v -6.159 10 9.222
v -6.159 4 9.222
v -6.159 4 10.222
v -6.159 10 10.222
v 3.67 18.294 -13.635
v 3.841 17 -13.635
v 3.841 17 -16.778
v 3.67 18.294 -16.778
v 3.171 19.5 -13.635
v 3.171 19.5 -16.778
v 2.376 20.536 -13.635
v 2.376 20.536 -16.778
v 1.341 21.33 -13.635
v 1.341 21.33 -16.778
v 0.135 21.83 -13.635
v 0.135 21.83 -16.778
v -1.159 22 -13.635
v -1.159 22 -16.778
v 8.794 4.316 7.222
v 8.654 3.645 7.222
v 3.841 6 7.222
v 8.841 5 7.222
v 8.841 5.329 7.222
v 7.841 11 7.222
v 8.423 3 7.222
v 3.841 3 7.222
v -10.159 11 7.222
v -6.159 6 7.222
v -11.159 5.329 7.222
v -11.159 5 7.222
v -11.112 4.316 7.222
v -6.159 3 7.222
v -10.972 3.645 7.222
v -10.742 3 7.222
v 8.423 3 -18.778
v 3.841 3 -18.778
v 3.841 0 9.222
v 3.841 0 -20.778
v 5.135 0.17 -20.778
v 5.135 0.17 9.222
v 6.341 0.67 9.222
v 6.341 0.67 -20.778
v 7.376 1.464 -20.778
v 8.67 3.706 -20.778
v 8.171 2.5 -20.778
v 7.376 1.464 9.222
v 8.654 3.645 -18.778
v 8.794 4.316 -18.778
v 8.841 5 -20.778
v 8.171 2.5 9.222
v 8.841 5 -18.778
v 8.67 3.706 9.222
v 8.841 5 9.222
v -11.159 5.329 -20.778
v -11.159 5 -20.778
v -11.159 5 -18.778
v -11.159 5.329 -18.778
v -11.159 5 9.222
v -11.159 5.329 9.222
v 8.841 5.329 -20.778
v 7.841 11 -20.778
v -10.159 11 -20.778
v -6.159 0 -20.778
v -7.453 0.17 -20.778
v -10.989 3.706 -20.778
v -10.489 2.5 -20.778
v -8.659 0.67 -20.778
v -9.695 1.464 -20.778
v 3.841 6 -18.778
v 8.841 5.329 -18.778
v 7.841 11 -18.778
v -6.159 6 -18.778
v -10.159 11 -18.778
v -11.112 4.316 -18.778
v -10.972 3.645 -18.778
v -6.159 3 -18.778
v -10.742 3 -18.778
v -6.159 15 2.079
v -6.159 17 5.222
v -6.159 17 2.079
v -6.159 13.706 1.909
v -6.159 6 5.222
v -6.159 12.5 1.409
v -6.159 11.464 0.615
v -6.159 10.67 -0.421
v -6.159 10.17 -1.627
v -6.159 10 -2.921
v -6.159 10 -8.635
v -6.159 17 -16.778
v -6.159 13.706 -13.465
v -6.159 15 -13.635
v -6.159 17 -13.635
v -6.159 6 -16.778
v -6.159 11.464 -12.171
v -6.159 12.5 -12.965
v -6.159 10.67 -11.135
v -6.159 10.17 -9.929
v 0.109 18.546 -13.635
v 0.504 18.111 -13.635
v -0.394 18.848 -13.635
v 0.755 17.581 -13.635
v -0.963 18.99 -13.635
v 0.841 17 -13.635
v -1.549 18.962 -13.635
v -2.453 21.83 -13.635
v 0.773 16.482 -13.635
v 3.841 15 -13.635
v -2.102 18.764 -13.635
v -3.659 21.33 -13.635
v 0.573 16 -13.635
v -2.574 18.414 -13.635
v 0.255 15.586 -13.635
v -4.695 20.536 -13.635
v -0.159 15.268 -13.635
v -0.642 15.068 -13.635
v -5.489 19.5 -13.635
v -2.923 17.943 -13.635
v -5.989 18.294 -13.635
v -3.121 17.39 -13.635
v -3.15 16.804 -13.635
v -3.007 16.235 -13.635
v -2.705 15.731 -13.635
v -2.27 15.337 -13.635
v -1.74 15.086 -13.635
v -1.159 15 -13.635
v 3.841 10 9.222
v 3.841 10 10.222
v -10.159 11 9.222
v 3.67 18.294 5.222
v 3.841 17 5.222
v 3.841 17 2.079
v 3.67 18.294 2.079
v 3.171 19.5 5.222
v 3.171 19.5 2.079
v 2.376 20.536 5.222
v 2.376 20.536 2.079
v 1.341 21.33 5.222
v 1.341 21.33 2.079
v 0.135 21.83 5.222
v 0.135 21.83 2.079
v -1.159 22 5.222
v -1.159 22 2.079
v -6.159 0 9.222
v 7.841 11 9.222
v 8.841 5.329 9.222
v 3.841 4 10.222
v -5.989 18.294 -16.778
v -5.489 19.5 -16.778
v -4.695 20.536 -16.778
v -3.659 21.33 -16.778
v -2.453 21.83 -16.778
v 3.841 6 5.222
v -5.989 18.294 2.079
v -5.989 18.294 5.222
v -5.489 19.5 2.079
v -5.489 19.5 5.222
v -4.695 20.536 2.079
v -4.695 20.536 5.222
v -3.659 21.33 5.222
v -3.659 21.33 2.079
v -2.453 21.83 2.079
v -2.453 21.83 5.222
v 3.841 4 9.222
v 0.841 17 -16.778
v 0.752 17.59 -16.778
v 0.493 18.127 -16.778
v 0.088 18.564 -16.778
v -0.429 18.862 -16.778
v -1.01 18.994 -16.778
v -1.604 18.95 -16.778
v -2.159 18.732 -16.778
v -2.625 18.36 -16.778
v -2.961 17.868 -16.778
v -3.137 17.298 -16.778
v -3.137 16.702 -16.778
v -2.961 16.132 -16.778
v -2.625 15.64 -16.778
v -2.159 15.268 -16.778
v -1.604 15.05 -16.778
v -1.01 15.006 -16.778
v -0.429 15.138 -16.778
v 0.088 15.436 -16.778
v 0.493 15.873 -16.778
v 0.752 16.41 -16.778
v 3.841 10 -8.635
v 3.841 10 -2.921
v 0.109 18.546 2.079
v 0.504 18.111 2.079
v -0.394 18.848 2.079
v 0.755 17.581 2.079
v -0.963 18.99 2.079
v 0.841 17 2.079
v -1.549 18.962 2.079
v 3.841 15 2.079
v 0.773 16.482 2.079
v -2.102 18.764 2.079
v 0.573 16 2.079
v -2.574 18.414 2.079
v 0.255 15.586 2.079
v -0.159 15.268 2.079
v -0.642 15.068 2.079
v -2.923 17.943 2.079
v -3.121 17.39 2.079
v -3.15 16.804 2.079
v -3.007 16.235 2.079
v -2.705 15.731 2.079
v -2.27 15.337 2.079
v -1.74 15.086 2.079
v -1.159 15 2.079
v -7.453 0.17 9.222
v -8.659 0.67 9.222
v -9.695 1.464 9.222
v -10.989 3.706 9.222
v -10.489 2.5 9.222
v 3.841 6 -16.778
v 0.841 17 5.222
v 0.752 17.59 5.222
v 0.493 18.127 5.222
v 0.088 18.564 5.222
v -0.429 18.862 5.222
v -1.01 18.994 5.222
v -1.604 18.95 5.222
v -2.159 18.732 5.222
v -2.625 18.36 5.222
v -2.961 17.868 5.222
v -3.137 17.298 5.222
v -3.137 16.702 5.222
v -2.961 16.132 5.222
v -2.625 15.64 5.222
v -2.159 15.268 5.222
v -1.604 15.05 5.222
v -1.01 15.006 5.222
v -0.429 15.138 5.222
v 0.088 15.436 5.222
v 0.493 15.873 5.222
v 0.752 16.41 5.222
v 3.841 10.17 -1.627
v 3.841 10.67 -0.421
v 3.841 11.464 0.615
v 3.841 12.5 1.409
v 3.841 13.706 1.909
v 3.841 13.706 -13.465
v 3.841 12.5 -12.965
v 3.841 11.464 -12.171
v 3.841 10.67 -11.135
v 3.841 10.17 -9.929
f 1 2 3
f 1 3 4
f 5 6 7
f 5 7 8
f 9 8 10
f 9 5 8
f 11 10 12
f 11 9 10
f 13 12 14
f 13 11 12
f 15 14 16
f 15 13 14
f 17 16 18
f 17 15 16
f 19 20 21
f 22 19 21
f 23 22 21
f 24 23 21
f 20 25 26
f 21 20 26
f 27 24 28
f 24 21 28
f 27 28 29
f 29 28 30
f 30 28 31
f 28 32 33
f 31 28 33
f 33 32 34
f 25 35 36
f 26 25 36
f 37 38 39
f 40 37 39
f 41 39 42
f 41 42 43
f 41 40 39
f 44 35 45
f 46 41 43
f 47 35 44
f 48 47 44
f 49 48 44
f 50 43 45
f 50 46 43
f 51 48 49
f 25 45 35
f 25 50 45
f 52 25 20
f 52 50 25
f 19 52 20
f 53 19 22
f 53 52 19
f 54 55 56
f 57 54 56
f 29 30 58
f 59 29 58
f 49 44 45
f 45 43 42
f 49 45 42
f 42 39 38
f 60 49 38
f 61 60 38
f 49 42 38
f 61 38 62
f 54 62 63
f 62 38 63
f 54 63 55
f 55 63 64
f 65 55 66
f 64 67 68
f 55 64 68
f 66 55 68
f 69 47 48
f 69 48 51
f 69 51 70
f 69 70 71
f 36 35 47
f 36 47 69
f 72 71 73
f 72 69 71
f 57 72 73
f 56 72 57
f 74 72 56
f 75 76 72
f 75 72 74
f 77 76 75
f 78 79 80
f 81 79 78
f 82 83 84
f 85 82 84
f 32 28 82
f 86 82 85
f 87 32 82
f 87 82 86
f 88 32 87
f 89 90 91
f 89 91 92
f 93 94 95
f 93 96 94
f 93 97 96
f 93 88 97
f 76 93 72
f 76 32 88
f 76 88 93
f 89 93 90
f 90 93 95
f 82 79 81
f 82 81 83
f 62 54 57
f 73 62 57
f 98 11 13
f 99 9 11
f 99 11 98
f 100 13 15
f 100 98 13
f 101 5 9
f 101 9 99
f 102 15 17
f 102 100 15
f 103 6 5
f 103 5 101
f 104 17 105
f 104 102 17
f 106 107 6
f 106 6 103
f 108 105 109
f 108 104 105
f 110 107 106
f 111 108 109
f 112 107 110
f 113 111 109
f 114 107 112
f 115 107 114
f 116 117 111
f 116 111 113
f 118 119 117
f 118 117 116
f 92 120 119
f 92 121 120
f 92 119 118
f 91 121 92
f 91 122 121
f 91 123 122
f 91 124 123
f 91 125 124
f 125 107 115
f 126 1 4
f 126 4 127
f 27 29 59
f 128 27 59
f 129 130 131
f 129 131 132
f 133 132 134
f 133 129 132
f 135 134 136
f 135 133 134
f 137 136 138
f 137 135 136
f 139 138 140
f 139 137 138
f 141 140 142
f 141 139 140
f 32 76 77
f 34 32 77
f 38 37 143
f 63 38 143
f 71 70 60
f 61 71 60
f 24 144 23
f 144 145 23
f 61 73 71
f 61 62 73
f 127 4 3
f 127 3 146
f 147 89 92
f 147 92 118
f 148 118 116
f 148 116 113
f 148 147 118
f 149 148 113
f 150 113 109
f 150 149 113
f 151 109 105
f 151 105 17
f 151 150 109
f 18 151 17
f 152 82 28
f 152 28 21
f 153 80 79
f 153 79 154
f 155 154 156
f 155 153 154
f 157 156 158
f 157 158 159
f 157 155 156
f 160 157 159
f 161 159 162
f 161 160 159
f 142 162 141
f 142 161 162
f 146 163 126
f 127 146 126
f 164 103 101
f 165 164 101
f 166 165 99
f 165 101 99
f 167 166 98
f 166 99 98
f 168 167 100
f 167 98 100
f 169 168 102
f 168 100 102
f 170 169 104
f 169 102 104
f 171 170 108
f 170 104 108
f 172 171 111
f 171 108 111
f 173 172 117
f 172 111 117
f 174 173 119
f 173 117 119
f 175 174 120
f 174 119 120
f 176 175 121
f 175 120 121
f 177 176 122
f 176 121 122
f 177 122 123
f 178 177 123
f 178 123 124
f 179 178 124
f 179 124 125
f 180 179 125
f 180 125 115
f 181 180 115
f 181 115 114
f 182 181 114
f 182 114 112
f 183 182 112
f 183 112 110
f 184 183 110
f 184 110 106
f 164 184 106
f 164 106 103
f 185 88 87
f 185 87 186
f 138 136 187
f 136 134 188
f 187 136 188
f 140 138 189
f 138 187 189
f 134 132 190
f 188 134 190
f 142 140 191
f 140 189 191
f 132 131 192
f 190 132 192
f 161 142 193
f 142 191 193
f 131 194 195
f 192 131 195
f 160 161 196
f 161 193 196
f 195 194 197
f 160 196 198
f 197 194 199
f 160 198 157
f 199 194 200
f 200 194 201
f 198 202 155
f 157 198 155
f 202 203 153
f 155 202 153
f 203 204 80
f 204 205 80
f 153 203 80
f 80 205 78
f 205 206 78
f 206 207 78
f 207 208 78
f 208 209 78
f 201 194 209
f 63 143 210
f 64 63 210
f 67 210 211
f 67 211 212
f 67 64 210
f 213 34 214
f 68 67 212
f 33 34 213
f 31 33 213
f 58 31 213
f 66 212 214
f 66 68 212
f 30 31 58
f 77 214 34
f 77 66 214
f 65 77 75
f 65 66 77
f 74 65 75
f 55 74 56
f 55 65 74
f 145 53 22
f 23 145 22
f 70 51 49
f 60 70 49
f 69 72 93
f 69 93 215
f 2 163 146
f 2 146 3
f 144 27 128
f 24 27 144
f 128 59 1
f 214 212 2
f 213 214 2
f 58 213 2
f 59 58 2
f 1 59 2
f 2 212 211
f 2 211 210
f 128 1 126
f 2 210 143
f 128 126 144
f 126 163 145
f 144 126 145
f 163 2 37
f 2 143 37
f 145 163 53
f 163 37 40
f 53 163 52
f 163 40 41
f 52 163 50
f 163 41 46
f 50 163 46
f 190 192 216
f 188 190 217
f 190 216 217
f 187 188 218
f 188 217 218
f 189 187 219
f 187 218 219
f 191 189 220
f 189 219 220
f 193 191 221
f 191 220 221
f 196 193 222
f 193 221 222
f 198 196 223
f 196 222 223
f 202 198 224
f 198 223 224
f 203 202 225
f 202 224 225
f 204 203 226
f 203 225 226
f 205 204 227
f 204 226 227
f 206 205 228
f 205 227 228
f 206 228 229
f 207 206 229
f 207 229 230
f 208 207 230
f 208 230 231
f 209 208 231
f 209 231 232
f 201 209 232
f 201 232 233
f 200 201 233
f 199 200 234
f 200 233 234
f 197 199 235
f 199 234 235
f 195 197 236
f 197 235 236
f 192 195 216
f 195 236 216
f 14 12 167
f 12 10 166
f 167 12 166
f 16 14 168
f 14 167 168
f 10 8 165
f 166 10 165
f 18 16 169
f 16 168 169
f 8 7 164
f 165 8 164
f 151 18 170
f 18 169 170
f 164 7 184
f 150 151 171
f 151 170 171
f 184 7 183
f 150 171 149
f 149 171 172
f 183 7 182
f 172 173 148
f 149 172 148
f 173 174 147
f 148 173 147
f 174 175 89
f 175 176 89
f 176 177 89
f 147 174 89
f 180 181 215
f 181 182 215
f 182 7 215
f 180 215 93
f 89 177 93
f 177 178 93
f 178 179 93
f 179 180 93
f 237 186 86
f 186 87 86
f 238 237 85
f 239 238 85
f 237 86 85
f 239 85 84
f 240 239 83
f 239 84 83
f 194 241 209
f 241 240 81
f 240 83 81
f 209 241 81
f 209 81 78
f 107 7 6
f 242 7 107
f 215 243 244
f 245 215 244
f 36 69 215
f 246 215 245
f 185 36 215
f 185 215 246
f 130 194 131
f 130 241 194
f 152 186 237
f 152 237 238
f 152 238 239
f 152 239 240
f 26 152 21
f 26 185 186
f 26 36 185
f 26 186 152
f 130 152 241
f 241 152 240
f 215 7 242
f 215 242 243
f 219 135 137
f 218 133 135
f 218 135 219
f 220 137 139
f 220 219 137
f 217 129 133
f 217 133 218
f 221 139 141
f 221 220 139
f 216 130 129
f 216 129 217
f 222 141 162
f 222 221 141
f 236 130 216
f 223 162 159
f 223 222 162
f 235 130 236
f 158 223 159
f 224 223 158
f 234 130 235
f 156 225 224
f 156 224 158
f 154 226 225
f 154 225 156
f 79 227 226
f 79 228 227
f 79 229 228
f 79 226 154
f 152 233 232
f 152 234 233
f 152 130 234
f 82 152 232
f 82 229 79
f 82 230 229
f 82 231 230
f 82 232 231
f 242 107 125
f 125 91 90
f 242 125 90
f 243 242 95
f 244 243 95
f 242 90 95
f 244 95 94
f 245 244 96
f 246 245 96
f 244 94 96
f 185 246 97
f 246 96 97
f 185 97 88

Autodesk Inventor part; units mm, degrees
ref_plane "YZ Plane" through (0, 0, 0) normal (1, 0, 0) x (0, 1, 0)
ref_plane "XZ Plane" through (0, 0, 0) normal (0, 1, 0) x (-1, 0, 0)
sketch "Sketch2" plane through (0, 0, 0) normal (0, 1, 0) x (-1, 0, 0)
  line L0 (11.1593, 9.222) -> (-8.8407, 9.222)
  line L1 (-8.8407, 9.222) -> (-8.8407, -20.778)
  line L2 (-8.8407, -20.778) -> (11.1593, -20.778)
  line L3 (11.1593, -20.778) -> (11.1593, 9.222)
  point P0 (0, 0)
  dimension "d23" = 30
  dimension "d24" = 20
extrude "Extrusion2" add sketch "Sketch2" along normal blind 3
sketch "Sketch3" plane through (0, 3, 0) normal (0, 1, 0) x (1, 0, 0)
  line L0 (8.8407, -9.222) -> (8.8407, 20.778) projected
  line L1 (8.8407, 20.778) -> (-11.1593, 20.778) projected
  line L2 (-11.1593, 20.778) -> (-11.1593, -9.222) projected
  line L3 (-11.1593, -9.222) -> (8.8407, -9.222) projected
  line L4 (8.8407, -9.222) -> (8.8407, 20.778) projected
  line L5 (8.8407, 5.778) -> (-11.1593, 5.778)
  line L6 (-11.1593, 20.778) -> (-11.1593, -9.222) projected
  line L7 (8.8407, -7.222) -> (-11.1593, -7.222)
  line L8 (3.8407, -7.222) -> (-6.1593, -7.222)
  line L9 (-6.1593, -7.222) -> (-6.1593, 5.778)
  line L10 (-6.1593, 5.778) -> (3.8407, 5.778)
  line L11 (3.8407, 5.778) -> (3.8407, -7.222)
  line L12 (8.8407, 20.778) -> (8.8407, -9.222)
  line L13 (-11.1593, -9.222) -> (-11.1593, 20.778)
  line L14 (-11.1593, 20.778) -> (8.8407, 20.778)
  line L15 (8.8407, 20.778) -> (8.8407, -9.222)
  line L16 (-11.1593, -9.222) -> (-11.1593, 20.778)
  line L17 (8.8407, 18.778) -> (-11.1593, 18.778)
  line L18 (3.8407, 18.778) -> (-6.1593, 18.778)
  line L19 (-6.1593, 18.778) -> (-6.1593, 5.778)
  line L20 (3.8407, 5.778) -> (3.8407, 18.778)
  point P0 (0, 0)
  point P1 (8.8407, 18.778)
  point P2 (-11.1593, 18.778)
  point P3 (-6.1593, 18.778)
  point P4 (-6.1593, -7.222)
  dimension "d27" = 2
  dimension "d28" = 10
  dimension "d29" = 5
  dimension "d53" = 20
extrude "Extrusion3" add sketch "Sketch3" along normal blind 3 contours L3 L2 L7 L0 | L7 L9 L5 L11 | L17 L2 L1 L0 | L5 L19 L17 L20
sketch "Sketch4" plane through (0, 6, 0) normal (0, 1, 0) x (1, 0, 0)
  line L0 (8.8407, -7.222) -> (3.8407, -7.222) projected
  line L1 (8.8407, -9.222) -> (8.8407, -7.222) projected
  line L2 (8.8407, -7.222) -> (3.8407, -7.222) projected
  line L3 (3.8407, -7.222) -> (3.8407, 18.778) projected
  line L4 (3.8407, 18.778) -> (8.8407, 18.778) projected
  line L5 (8.8407, 18.778) -> (8.8407, 20.778) projected
  line L6 (8.8407, 20.778) -> (-11.1593, 20.778) projected
  line L7 (-11.1593, 20.778) -> (-11.1593, 18.778) projected
  line L8 (-11.1593, 18.778) -> (-6.1593, 18.778) projected
  line L9 (-6.1593, 18.778) -> (-6.1593, -7.222) projected
  line L10 (-6.1593, -7.222) -> (-11.1593, -7.222) projected
  line L11 (-11.1593, -7.222) -> (-11.1593, -9.222) projected
  line L12 (-11.1593, -9.222) -> (8.8407, -9.222) projected
  line L13 (8.8407, -7.222) -> (-11.1593, -7.222)
  line L14 (8.8407, -9.222) -> (8.8407, 20.778) projected
  line L15 (-11.1593, 18.778) -> (-11.1593, -7.222) projected
  line L16 (-11.1593, 18.778) -> (8.8407, 18.778)
  point P0 (0, 0)
extrude "Extrusion4" add sketch "Sketch4" along normal blind 5 contours L1 L12 L11 L10 L13 L0 | L4 L16 L8 L7 L6 L5
ref_plane "Work Plane1" through (8.8407, 0, -5.778) normal (0, 0, -1) x (-1, 0, 0)
chamfer "Chamfer1" distance 1 angle 80 2 edges at (8.8407, 11, 8.222) (-11.1593, 11, 8.222) measured on face at (2.174, 11, 8.5554)
chamfer "Chamfer2" distance 1 angle 80 2 edges at (8.8407, 11, -19.778) (-11.1593, 11, -19.778) measured on face at (2.174, 11, -19.4446)
sketch "Sketch5" plane through (0, 6, 0) normal (0, 1, 0) x (1, 0, 0)
  line L0 (-6.1593, -7.222) -> (3.8407, -7.222) projected
  line L1 (3.8407, -7.222) -> (3.8407, 18.778) projected
  line L2 (3.8407, 18.778) -> (-6.1593, 18.778) projected
  line L3 (-6.1593, 18.778) -> (-6.1593, -7.222) projected
  line L4 (3.8407, -5.222) -> (-6.1593, -5.222)
  line L5 (-6.1593, 18.778) -> (-6.1593, -7.222) projected
  line L6 (-15.1593, 5.778) -> (12.8407, 5.778) projected
  line L7 (3.8407, 16.778) -> (-6.1593, 16.778)
  point P0 (0, 0)
  point P1 (3.8407, 16.778)
  point P2 (-6.1593, 16.778)
  dimension "d40" = 11
  dimension "d54" = 26
extrude "Extrusion5" add sketch "Sketch5" along normal blind 4 contours L3 L6 L1 L4 | L3 L7 L1 L6
sketch "Sketch6" plane through (0, 10, 0) normal (0, 1, 0) x (1, 0, 0)
  line L0 (-6.1593, -7.222) -> (-6.1593, 18.778) projected
  line L1 (3.8407, 18.778) -> (3.8407, -7.222) projected
  line L2 (3.8407, -5.222) -> (3.8407, -2.0792)
  line L3 (3.8407, -2.0792) -> (-6.1593, -2.0792)
  line L4 (-6.1593, -2.0792) -> (-6.1593, -5.222)
  line L5 (3.8407, 16.778) -> (-6.1593, 16.778) projected
  line L6 (-6.1593, -5.222) -> (3.8407, -5.222) projected
  line L7 (-6.1593, 5.778) -> (3.8407, 5.778)
  line L8 (3.8407, 13.6351) -> (-6.1593, 13.6351)
  point P0 (0, 0)
  point P1 (-6.1593, -2.0792)
  point P2 (-6.1593, 13.6351)
  point P3 (3.8407, 13.6351)
  dimension "d43" = 22
  dimension "d44" = 3.1429
extrude "Extrusion6" add sketch "Sketch6" along normal blind 12 contours L0 L3 L1 L6 | L0 L5 L1 L8
fillet "Fillet1" radius 5 4 edges at (3.8407, 22, 3.6506) (-6.1593, 22, 3.6506) (-6.1593, 22, -15.2065) (3.8407, 22, -15.2065)
fillet "Fillet2" radius 5 2 edges at (-11.1593, 0, -5.778) (8.8407, 0, -5.778)
fillet "Fillet3" radius 5 2 edges at (-1.1593, 10, -13.6351) (-1.1593, 10, 2.0792)
sketch "Sketch9" plane through (-10.1593, 11, 9.222) normal (0, 0, 1) x (1, 0, 0)
  line L0 (0, 0) -> (18, 0) projected
  line L1 (4, -5) -> (4, 6) projected
  line L2 (14, -5) -> (14, 6) projected
  line L3 (0, 0) -> (18, 0) projected
  line L4 (4, 0) -> (14, 0)
  line L5 (14, 0) -> (14, -7)
  line L6 (14, -7) -> (4, -7)
  line L7 (4, -7) -> (4, 0)
  line L8 (4, -1) -> (14, -1)
  point P0 (10.1593, -11)
  point P1 (14, -1)
  point P2 (4, -1)
  dimension "d58" = 6
  dimension "d59" = 1
  dimension "d62" = 10
extrude "Extrusion8" add sketch "Sketch9" along normal blind 1 contours L8 L2 L5 L6 L7 L1
sketch "Sketch10" plane through (-6.1593, 6, 5.222) normal (0, 0, 1) x (1, 0, 0)
  circle A0 centre (5, 11) radius 2
  arc A1 (10, 11) -> (0, 11) centre (5, 11) ccw projected
  point P0 (6.1593, -6)
  dimension "d63" = 4
extrude "Extrusion9" cut sketch "Sketch10" against normal through all
equation "\"d27\" = 0.1 * d53"
equation "\"d28\" = 0.5 * d53"
equation "\"d29\" = 0.25 * d53"
equation "\"d44\" = 0.142857 * d43"
properties part number "uchytka_spojky_medzi_velkym_strednym"
